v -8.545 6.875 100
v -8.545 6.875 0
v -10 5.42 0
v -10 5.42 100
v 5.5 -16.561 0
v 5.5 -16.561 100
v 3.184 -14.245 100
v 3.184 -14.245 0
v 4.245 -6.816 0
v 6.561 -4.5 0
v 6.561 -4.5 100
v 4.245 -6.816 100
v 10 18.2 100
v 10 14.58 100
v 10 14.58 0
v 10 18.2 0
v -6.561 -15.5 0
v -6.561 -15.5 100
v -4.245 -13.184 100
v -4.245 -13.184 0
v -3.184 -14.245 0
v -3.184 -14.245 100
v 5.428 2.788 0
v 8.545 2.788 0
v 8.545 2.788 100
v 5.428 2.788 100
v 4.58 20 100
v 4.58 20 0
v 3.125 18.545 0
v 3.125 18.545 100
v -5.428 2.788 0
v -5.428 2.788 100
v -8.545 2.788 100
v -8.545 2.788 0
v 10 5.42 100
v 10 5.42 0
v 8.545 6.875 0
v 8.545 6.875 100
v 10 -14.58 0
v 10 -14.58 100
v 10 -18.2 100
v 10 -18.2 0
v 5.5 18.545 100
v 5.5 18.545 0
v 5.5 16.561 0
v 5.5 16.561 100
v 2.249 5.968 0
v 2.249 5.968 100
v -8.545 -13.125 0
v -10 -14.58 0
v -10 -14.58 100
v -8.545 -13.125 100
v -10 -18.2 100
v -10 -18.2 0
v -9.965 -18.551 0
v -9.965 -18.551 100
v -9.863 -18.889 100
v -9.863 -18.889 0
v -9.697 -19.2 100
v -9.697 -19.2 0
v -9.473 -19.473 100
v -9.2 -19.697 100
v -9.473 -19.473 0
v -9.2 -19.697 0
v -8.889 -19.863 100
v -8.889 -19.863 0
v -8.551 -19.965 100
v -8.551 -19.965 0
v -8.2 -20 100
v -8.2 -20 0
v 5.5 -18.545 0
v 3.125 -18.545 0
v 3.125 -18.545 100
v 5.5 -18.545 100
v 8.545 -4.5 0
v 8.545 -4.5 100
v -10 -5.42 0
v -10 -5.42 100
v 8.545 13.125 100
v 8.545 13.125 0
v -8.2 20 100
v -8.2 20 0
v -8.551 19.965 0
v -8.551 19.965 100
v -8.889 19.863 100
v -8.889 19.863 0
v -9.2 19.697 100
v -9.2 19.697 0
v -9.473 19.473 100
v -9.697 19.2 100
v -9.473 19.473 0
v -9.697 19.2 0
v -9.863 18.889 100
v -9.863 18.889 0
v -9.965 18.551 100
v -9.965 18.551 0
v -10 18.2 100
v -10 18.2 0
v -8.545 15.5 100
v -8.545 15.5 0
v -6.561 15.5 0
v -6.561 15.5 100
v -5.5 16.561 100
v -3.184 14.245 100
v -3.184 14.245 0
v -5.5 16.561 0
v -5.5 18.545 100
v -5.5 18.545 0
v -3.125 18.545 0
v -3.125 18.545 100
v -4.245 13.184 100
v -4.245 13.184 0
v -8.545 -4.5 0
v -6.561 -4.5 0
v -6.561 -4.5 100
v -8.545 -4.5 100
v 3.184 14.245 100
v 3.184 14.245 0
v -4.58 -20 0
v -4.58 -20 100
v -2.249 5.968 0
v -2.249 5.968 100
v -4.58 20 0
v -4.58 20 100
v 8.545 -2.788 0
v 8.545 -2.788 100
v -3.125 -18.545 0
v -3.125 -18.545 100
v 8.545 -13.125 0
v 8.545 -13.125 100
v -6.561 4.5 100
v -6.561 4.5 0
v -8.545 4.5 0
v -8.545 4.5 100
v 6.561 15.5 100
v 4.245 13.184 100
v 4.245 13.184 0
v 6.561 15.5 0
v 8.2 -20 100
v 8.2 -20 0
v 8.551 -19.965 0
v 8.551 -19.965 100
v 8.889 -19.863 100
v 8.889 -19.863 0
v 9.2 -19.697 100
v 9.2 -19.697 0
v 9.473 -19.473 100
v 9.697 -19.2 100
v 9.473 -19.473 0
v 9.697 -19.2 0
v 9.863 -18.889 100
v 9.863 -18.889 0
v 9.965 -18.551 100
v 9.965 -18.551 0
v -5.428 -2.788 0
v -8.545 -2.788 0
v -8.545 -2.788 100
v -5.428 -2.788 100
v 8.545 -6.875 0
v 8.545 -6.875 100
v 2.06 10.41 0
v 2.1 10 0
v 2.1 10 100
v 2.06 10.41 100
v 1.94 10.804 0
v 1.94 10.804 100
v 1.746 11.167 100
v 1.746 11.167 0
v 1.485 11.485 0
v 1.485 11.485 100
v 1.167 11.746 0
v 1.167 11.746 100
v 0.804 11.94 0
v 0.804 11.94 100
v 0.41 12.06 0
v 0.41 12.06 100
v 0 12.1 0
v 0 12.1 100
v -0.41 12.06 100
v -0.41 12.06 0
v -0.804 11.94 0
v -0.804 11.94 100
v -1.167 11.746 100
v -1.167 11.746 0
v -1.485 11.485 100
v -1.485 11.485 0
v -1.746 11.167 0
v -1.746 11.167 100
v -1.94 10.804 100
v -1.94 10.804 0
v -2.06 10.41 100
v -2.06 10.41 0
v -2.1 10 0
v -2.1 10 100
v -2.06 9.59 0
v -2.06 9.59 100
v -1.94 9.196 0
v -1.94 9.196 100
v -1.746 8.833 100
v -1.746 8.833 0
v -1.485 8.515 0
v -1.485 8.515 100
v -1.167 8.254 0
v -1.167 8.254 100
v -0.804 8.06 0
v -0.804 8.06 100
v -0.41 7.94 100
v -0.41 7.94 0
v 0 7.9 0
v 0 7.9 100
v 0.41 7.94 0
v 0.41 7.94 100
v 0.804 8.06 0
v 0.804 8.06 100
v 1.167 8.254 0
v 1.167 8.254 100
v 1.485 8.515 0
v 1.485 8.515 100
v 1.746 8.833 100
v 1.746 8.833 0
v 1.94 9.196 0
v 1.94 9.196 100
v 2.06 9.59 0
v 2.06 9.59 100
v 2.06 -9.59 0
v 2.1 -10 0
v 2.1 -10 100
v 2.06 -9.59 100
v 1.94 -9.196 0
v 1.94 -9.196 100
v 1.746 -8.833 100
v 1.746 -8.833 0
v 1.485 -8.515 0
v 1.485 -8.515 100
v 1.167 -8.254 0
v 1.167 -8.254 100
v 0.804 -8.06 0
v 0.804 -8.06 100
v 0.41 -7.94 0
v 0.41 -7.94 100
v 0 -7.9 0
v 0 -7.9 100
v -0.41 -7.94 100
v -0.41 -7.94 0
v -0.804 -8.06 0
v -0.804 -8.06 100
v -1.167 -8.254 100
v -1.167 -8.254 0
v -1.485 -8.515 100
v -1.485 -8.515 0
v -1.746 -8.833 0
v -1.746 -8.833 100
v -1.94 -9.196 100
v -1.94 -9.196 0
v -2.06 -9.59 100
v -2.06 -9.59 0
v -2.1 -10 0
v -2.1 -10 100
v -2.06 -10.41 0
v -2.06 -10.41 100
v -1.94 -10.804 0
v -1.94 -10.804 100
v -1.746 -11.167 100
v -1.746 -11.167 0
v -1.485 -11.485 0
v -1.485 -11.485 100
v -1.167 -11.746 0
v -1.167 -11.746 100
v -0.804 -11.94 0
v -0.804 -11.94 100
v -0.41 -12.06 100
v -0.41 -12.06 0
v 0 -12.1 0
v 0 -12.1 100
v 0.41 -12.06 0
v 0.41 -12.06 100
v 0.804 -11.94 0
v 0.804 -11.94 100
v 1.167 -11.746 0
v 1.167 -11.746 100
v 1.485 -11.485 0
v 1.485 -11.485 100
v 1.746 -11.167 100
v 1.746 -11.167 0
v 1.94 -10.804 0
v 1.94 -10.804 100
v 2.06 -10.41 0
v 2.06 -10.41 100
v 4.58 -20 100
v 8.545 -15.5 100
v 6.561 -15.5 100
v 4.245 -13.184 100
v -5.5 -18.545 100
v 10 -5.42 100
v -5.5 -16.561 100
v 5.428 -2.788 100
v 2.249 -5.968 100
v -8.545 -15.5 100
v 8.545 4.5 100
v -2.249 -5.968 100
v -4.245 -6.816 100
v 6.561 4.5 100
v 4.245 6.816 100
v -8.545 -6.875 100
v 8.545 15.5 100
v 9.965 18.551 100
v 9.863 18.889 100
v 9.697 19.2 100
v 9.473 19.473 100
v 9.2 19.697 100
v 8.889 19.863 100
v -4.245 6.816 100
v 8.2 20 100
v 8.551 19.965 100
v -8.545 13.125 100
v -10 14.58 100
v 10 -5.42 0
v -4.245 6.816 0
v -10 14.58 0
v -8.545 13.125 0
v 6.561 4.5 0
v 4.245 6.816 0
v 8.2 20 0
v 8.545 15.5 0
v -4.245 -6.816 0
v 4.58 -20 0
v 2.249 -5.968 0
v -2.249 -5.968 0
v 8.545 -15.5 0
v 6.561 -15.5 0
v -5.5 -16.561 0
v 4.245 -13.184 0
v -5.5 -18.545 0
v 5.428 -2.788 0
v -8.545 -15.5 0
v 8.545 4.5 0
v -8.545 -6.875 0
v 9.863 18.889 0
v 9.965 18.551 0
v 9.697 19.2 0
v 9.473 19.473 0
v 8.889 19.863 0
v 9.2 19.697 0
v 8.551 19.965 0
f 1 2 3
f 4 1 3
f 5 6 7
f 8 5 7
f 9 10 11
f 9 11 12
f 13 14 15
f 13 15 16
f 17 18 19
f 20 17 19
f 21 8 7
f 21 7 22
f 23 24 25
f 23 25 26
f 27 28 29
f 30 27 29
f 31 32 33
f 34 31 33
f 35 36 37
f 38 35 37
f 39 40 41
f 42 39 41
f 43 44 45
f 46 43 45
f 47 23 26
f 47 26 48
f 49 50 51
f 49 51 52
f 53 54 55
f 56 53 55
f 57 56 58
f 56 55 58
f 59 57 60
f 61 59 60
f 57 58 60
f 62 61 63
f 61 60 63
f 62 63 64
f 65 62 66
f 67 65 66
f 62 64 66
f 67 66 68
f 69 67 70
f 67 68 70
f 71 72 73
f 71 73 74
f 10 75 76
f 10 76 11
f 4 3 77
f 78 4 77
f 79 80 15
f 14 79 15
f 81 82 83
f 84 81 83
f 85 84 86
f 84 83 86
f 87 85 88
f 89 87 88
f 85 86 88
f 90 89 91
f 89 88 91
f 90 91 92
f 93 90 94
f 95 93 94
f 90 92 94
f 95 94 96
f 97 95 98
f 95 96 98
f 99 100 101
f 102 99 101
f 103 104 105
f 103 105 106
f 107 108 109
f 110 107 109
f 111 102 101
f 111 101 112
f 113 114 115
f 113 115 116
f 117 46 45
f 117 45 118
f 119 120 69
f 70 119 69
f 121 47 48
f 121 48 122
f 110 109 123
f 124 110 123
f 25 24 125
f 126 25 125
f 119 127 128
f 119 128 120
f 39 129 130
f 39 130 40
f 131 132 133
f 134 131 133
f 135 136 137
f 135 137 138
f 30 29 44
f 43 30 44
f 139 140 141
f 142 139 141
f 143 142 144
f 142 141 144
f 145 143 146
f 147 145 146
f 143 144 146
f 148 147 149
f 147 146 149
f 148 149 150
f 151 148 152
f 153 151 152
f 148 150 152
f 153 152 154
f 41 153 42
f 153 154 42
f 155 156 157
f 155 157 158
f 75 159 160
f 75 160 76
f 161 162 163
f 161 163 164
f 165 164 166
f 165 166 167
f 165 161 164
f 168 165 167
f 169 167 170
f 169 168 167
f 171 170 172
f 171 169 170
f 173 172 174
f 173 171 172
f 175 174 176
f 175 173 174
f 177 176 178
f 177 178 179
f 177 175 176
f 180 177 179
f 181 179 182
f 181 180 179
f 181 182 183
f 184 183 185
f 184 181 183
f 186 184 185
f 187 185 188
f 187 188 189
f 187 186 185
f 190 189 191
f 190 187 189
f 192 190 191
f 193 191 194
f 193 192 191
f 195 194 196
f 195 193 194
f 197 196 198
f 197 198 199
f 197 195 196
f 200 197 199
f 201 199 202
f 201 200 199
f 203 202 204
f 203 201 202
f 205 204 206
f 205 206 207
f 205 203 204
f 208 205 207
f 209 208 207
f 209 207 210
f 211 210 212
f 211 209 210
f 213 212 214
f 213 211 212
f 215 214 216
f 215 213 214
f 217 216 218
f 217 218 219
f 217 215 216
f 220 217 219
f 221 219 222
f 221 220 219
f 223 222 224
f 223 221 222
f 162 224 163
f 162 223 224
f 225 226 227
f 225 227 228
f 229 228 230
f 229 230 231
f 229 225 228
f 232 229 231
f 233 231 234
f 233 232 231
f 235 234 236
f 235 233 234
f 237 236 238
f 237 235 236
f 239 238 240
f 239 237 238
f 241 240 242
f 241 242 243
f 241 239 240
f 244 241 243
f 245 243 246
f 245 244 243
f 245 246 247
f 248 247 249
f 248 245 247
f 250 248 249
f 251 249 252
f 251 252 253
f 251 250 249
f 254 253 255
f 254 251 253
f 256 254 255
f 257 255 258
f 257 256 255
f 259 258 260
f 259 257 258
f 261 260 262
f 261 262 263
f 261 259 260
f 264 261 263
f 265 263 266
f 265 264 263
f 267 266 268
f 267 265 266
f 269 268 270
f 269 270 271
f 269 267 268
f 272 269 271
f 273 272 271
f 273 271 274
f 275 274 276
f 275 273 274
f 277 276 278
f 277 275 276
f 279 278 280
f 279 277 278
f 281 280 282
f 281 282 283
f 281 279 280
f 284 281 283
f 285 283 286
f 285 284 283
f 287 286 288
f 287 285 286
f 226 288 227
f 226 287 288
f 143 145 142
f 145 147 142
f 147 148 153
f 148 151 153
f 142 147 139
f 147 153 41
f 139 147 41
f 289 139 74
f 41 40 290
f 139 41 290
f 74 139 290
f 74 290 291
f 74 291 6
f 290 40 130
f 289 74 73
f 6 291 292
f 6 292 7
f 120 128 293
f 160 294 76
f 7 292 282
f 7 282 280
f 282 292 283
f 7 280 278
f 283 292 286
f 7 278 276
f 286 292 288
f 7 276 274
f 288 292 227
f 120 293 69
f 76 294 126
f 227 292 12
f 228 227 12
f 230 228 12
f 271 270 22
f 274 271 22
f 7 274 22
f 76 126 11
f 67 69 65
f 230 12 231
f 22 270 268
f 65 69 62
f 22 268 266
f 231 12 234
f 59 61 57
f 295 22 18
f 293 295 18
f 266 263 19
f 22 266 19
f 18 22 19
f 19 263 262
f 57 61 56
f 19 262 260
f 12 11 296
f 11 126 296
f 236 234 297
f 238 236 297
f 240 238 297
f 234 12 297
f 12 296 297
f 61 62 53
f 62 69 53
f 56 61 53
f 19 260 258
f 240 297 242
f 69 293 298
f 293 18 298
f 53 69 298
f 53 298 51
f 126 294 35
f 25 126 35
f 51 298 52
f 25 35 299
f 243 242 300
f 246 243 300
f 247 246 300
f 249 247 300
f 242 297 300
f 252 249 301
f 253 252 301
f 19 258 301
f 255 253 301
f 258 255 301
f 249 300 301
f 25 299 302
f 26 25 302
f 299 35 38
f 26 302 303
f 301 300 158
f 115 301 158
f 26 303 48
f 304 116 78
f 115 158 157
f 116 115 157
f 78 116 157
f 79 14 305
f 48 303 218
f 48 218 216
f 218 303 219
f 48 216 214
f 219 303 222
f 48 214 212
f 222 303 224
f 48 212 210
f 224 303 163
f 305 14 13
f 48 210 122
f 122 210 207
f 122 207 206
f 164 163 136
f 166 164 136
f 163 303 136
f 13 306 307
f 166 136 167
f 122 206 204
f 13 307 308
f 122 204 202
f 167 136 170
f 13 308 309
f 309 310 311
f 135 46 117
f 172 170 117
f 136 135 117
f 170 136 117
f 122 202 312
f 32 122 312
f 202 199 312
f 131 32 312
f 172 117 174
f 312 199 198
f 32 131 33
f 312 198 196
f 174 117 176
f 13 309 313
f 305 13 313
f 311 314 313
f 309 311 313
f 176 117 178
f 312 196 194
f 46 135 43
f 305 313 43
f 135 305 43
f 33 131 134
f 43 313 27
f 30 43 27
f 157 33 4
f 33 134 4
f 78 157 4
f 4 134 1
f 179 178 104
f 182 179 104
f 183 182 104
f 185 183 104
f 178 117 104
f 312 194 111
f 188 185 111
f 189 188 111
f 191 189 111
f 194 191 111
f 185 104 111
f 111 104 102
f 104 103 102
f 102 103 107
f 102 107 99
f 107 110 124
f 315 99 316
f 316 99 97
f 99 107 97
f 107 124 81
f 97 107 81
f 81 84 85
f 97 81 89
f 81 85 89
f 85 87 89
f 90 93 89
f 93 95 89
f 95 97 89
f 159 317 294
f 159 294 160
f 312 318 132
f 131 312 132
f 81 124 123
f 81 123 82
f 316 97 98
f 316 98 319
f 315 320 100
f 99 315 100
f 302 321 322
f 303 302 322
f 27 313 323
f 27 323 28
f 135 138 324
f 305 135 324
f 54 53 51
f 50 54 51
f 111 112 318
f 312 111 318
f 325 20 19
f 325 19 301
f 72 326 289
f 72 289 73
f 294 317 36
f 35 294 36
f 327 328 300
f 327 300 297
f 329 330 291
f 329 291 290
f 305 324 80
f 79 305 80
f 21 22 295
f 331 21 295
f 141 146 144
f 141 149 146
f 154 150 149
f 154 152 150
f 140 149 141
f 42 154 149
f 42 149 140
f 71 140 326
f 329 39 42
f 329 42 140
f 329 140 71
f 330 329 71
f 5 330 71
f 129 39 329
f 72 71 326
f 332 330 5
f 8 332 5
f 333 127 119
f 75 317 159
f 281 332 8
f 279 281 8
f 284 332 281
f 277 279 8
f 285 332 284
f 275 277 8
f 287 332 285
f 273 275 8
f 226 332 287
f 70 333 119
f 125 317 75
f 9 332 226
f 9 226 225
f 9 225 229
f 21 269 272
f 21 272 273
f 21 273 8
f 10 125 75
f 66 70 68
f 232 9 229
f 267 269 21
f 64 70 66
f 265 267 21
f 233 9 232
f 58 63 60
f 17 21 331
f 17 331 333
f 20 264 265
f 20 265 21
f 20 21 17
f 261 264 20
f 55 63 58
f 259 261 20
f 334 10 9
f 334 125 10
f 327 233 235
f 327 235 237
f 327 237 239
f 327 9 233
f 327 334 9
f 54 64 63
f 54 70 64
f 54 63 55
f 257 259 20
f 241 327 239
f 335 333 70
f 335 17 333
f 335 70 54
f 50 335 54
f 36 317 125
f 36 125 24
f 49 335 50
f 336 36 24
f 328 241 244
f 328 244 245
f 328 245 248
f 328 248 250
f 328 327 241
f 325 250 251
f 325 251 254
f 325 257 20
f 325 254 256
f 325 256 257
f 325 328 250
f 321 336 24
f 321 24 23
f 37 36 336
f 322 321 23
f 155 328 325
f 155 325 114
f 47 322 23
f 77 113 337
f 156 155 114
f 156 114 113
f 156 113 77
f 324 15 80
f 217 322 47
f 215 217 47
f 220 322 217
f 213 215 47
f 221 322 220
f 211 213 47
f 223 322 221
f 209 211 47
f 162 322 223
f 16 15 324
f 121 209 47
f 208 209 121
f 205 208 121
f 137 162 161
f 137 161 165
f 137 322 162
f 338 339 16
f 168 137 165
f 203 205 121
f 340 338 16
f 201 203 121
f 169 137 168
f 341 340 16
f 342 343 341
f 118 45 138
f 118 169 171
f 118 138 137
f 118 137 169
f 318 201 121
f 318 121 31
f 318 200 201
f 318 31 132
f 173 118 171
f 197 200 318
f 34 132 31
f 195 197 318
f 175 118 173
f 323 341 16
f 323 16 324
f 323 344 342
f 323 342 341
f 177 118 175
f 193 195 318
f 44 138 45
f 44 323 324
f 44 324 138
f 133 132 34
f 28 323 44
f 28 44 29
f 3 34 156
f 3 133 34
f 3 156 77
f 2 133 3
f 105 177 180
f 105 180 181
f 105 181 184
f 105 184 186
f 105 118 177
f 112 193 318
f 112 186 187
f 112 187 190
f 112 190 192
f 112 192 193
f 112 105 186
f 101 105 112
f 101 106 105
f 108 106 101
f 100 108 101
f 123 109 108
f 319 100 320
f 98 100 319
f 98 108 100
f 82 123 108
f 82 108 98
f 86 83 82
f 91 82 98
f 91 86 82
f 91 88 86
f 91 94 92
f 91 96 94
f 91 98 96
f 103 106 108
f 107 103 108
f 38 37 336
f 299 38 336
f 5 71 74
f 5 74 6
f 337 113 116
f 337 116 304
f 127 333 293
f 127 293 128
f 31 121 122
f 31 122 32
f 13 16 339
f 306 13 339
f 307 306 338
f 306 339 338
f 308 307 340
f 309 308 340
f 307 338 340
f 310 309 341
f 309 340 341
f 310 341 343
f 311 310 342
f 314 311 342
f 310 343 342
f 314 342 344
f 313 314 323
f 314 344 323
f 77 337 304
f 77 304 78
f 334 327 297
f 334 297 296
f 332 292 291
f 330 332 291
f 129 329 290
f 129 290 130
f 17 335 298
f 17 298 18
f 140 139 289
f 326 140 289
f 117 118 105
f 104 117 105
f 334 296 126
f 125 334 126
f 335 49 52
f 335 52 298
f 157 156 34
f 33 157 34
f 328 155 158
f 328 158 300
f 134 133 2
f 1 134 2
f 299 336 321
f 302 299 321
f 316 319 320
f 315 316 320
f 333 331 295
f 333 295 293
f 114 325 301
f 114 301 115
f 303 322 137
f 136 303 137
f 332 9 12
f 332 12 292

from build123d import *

# Parameters (mm, degrees)
SKETCH001_R = 2.1
PAD_DEPTH   = 100


with BuildPart() as part:
    # Sketch001 → Pad (new body)
    with BuildSketch(Plane.XY):
        with BuildLine():
            Line((10, 0), (10, -5.42))
            Line((10, -5.42), (8.545, -6.875))
            Line((8.545, -6.875), (8.545, -4.5))
            Line((8.545, -4.5), (6.56066, -4.5))
            Line((6.56066, -4.5), (4.245, -6.81566))
            Line((4.245, -6.81566), (4.245, -13.18434))
            Line((4.245, -13.18434), (6.56066, -15.5))
            Line((6.56066, -15.5), (8.545, -15.5))
            Line((8.545, -15.5), (8.545, -13.125))
            Line((8.545, -13.125), (10, -14.58))
            Line((10, -14.58), (10, -18.2))
            ThreePointArc((8.2, -20), (9.472792, -19.472792), (10, -18.2))
            Line((8.2, -20), (4.58, -20))
            Line((4.58, -20), (3.125, -18.545))
            Line((3.125, -18.545), (5.5, -18.545))
            Line((5.5, -18.545), (5.5, -16.56066))
            Line((5.5, -16.56066), (3.18434, -14.245))
            Line((3.18434, -14.245), (-3.18434, -14.245))
            Line((-3.18434, -14.245), (-5.5, -16.56066))
            Line((-5.5, -16.56066), (-5.5, -18.545))
            Line((-5.5, -18.545), (-3.125, -18.545))
            Line((-3.125, -18.545), (-4.58, -20))
            Line((-4.58, -20), (-8.2, -20))
            ThreePointArc((-10, -18.2), (-9.472792, -19.472792), (-8.2, -20))
            Line((-10, -18.2), (-10, -14.58))
            Line((-10, -14.58), (-8.545, -13.125))
            Line((-8.545, -13.125), (-8.545, -15.5))
            Line((-8.545, -15.5), (-6.56066, -15.5))
            Line((-6.56066, -15.5), (-4.245, -13.18434))
            Line((-4.245, -13.18434), (-4.245, -6.81566))
            Line((-4.245, -6.81566), (-6.56066, -4.5))
            Line((-6.56066, -4.5), (-8.545, -4.5))
            Line((-8.545, -4.5), (-8.545, -6.875))
            Line((-8.545, -6.875), (-10, -5.42))
            Line((-10, -5.42), (-10, 0))
            Line((-10, 5.42), (-10, 0))
            Line((-8.545, 6.875), (-10, 5.42))
            Line((-8.545, 4.5), (-8.545, 6.875))
            Line((-6.56066, 4.5), (-8.545, 4.5))
            Line((-4.245, 6.81566), (-6.56066, 4.5))
            Line((-4.245, 13.18434), (-4.245, 6.81566))
            Line((-6.56066, 15.5), (-4.245, 13.18434))
            Line((-8.545, 15.5), (-6.56066, 15.5))
            Line((-8.545, 13.125), (-8.545, 15.5))
            Line((-10, 14.58), (-8.545, 13.125))
            Line((-10, 18.2), (-10, 14.58))
            ThreePointArc((-8.2, 20), (-9.472792, 19.472792), (-10, 18.2))
            Line((-4.58, 20), (-8.2, 20))
            Line((-3.125, 18.545), (-4.58, 20))
            Line((-5.5, 18.545), (-3.125, 18.545))
            Line((-5.5, 16.56066), (-5.5, 18.545))
            Line((-3.18434, 14.245), (-5.5, 16.56066))
            Line((3.18434, 14.245), (-3.18434, 14.245))
            Line((5.5, 16.56066), (3.18434, 14.245))
            Line((5.5, 18.545), (5.5, 16.56066))
            Line((3.125, 18.545), (5.5, 18.545))
            Line((4.58, 20), (3.125, 18.545))
            Line((8.2, 20), (4.58, 20))
            ThreePointArc((10, 18.2), (9.472792, 19.472792), (8.2, 20))
            Line((10, 14.58), (10, 18.2))
            Line((8.545, 13.125), (10, 14.58))
            Line((8.545, 15.5), (8.545, 13.125))
            Line((6.56066, 15.5), (8.545, 15.5))
            Line((4.245, 13.18434), (6.56066, 15.5))
            Line((4.245, 6.81566), (4.245, 13.18434))
            Line((6.56066, 4.5), (4.245, 6.81566))
            Line((8.545, 4.5), (6.56066, 4.5))
            Line((8.545, 6.875), (8.545, 4.5))
            Line((10, 5.42), (8.545, 6.875))
            Line((10, 0), (10, 5.42))
        make_face()
        with Locations((0, -10)):
            Circle(SKETCH001_R, mode=Mode.SUBTRACT)
        with Locations((0, 10)):
            Circle(SKETCH001_R, mode=Mode.SUBTRACT)
        Polygon((-8.545, 0), (-8.545, -2.788399), (-5.427946, -2.788399), (-2.248662, -5.967683), (2.248662, -5.967683), (5.427946, -2.788399), (8.545, -2.788399), (8.545, 0), (8.545, 2.788399), (5.427946, 2.788399), (2.248662, 5.967683), (-2.248662, 5.967683), (-5.427946, 2.788399), (-8.545, 2.788399), align=None, mode=Mode.SUBTRACT)
    extrude(amount=PAD_DEPTH)


solid = part.part
